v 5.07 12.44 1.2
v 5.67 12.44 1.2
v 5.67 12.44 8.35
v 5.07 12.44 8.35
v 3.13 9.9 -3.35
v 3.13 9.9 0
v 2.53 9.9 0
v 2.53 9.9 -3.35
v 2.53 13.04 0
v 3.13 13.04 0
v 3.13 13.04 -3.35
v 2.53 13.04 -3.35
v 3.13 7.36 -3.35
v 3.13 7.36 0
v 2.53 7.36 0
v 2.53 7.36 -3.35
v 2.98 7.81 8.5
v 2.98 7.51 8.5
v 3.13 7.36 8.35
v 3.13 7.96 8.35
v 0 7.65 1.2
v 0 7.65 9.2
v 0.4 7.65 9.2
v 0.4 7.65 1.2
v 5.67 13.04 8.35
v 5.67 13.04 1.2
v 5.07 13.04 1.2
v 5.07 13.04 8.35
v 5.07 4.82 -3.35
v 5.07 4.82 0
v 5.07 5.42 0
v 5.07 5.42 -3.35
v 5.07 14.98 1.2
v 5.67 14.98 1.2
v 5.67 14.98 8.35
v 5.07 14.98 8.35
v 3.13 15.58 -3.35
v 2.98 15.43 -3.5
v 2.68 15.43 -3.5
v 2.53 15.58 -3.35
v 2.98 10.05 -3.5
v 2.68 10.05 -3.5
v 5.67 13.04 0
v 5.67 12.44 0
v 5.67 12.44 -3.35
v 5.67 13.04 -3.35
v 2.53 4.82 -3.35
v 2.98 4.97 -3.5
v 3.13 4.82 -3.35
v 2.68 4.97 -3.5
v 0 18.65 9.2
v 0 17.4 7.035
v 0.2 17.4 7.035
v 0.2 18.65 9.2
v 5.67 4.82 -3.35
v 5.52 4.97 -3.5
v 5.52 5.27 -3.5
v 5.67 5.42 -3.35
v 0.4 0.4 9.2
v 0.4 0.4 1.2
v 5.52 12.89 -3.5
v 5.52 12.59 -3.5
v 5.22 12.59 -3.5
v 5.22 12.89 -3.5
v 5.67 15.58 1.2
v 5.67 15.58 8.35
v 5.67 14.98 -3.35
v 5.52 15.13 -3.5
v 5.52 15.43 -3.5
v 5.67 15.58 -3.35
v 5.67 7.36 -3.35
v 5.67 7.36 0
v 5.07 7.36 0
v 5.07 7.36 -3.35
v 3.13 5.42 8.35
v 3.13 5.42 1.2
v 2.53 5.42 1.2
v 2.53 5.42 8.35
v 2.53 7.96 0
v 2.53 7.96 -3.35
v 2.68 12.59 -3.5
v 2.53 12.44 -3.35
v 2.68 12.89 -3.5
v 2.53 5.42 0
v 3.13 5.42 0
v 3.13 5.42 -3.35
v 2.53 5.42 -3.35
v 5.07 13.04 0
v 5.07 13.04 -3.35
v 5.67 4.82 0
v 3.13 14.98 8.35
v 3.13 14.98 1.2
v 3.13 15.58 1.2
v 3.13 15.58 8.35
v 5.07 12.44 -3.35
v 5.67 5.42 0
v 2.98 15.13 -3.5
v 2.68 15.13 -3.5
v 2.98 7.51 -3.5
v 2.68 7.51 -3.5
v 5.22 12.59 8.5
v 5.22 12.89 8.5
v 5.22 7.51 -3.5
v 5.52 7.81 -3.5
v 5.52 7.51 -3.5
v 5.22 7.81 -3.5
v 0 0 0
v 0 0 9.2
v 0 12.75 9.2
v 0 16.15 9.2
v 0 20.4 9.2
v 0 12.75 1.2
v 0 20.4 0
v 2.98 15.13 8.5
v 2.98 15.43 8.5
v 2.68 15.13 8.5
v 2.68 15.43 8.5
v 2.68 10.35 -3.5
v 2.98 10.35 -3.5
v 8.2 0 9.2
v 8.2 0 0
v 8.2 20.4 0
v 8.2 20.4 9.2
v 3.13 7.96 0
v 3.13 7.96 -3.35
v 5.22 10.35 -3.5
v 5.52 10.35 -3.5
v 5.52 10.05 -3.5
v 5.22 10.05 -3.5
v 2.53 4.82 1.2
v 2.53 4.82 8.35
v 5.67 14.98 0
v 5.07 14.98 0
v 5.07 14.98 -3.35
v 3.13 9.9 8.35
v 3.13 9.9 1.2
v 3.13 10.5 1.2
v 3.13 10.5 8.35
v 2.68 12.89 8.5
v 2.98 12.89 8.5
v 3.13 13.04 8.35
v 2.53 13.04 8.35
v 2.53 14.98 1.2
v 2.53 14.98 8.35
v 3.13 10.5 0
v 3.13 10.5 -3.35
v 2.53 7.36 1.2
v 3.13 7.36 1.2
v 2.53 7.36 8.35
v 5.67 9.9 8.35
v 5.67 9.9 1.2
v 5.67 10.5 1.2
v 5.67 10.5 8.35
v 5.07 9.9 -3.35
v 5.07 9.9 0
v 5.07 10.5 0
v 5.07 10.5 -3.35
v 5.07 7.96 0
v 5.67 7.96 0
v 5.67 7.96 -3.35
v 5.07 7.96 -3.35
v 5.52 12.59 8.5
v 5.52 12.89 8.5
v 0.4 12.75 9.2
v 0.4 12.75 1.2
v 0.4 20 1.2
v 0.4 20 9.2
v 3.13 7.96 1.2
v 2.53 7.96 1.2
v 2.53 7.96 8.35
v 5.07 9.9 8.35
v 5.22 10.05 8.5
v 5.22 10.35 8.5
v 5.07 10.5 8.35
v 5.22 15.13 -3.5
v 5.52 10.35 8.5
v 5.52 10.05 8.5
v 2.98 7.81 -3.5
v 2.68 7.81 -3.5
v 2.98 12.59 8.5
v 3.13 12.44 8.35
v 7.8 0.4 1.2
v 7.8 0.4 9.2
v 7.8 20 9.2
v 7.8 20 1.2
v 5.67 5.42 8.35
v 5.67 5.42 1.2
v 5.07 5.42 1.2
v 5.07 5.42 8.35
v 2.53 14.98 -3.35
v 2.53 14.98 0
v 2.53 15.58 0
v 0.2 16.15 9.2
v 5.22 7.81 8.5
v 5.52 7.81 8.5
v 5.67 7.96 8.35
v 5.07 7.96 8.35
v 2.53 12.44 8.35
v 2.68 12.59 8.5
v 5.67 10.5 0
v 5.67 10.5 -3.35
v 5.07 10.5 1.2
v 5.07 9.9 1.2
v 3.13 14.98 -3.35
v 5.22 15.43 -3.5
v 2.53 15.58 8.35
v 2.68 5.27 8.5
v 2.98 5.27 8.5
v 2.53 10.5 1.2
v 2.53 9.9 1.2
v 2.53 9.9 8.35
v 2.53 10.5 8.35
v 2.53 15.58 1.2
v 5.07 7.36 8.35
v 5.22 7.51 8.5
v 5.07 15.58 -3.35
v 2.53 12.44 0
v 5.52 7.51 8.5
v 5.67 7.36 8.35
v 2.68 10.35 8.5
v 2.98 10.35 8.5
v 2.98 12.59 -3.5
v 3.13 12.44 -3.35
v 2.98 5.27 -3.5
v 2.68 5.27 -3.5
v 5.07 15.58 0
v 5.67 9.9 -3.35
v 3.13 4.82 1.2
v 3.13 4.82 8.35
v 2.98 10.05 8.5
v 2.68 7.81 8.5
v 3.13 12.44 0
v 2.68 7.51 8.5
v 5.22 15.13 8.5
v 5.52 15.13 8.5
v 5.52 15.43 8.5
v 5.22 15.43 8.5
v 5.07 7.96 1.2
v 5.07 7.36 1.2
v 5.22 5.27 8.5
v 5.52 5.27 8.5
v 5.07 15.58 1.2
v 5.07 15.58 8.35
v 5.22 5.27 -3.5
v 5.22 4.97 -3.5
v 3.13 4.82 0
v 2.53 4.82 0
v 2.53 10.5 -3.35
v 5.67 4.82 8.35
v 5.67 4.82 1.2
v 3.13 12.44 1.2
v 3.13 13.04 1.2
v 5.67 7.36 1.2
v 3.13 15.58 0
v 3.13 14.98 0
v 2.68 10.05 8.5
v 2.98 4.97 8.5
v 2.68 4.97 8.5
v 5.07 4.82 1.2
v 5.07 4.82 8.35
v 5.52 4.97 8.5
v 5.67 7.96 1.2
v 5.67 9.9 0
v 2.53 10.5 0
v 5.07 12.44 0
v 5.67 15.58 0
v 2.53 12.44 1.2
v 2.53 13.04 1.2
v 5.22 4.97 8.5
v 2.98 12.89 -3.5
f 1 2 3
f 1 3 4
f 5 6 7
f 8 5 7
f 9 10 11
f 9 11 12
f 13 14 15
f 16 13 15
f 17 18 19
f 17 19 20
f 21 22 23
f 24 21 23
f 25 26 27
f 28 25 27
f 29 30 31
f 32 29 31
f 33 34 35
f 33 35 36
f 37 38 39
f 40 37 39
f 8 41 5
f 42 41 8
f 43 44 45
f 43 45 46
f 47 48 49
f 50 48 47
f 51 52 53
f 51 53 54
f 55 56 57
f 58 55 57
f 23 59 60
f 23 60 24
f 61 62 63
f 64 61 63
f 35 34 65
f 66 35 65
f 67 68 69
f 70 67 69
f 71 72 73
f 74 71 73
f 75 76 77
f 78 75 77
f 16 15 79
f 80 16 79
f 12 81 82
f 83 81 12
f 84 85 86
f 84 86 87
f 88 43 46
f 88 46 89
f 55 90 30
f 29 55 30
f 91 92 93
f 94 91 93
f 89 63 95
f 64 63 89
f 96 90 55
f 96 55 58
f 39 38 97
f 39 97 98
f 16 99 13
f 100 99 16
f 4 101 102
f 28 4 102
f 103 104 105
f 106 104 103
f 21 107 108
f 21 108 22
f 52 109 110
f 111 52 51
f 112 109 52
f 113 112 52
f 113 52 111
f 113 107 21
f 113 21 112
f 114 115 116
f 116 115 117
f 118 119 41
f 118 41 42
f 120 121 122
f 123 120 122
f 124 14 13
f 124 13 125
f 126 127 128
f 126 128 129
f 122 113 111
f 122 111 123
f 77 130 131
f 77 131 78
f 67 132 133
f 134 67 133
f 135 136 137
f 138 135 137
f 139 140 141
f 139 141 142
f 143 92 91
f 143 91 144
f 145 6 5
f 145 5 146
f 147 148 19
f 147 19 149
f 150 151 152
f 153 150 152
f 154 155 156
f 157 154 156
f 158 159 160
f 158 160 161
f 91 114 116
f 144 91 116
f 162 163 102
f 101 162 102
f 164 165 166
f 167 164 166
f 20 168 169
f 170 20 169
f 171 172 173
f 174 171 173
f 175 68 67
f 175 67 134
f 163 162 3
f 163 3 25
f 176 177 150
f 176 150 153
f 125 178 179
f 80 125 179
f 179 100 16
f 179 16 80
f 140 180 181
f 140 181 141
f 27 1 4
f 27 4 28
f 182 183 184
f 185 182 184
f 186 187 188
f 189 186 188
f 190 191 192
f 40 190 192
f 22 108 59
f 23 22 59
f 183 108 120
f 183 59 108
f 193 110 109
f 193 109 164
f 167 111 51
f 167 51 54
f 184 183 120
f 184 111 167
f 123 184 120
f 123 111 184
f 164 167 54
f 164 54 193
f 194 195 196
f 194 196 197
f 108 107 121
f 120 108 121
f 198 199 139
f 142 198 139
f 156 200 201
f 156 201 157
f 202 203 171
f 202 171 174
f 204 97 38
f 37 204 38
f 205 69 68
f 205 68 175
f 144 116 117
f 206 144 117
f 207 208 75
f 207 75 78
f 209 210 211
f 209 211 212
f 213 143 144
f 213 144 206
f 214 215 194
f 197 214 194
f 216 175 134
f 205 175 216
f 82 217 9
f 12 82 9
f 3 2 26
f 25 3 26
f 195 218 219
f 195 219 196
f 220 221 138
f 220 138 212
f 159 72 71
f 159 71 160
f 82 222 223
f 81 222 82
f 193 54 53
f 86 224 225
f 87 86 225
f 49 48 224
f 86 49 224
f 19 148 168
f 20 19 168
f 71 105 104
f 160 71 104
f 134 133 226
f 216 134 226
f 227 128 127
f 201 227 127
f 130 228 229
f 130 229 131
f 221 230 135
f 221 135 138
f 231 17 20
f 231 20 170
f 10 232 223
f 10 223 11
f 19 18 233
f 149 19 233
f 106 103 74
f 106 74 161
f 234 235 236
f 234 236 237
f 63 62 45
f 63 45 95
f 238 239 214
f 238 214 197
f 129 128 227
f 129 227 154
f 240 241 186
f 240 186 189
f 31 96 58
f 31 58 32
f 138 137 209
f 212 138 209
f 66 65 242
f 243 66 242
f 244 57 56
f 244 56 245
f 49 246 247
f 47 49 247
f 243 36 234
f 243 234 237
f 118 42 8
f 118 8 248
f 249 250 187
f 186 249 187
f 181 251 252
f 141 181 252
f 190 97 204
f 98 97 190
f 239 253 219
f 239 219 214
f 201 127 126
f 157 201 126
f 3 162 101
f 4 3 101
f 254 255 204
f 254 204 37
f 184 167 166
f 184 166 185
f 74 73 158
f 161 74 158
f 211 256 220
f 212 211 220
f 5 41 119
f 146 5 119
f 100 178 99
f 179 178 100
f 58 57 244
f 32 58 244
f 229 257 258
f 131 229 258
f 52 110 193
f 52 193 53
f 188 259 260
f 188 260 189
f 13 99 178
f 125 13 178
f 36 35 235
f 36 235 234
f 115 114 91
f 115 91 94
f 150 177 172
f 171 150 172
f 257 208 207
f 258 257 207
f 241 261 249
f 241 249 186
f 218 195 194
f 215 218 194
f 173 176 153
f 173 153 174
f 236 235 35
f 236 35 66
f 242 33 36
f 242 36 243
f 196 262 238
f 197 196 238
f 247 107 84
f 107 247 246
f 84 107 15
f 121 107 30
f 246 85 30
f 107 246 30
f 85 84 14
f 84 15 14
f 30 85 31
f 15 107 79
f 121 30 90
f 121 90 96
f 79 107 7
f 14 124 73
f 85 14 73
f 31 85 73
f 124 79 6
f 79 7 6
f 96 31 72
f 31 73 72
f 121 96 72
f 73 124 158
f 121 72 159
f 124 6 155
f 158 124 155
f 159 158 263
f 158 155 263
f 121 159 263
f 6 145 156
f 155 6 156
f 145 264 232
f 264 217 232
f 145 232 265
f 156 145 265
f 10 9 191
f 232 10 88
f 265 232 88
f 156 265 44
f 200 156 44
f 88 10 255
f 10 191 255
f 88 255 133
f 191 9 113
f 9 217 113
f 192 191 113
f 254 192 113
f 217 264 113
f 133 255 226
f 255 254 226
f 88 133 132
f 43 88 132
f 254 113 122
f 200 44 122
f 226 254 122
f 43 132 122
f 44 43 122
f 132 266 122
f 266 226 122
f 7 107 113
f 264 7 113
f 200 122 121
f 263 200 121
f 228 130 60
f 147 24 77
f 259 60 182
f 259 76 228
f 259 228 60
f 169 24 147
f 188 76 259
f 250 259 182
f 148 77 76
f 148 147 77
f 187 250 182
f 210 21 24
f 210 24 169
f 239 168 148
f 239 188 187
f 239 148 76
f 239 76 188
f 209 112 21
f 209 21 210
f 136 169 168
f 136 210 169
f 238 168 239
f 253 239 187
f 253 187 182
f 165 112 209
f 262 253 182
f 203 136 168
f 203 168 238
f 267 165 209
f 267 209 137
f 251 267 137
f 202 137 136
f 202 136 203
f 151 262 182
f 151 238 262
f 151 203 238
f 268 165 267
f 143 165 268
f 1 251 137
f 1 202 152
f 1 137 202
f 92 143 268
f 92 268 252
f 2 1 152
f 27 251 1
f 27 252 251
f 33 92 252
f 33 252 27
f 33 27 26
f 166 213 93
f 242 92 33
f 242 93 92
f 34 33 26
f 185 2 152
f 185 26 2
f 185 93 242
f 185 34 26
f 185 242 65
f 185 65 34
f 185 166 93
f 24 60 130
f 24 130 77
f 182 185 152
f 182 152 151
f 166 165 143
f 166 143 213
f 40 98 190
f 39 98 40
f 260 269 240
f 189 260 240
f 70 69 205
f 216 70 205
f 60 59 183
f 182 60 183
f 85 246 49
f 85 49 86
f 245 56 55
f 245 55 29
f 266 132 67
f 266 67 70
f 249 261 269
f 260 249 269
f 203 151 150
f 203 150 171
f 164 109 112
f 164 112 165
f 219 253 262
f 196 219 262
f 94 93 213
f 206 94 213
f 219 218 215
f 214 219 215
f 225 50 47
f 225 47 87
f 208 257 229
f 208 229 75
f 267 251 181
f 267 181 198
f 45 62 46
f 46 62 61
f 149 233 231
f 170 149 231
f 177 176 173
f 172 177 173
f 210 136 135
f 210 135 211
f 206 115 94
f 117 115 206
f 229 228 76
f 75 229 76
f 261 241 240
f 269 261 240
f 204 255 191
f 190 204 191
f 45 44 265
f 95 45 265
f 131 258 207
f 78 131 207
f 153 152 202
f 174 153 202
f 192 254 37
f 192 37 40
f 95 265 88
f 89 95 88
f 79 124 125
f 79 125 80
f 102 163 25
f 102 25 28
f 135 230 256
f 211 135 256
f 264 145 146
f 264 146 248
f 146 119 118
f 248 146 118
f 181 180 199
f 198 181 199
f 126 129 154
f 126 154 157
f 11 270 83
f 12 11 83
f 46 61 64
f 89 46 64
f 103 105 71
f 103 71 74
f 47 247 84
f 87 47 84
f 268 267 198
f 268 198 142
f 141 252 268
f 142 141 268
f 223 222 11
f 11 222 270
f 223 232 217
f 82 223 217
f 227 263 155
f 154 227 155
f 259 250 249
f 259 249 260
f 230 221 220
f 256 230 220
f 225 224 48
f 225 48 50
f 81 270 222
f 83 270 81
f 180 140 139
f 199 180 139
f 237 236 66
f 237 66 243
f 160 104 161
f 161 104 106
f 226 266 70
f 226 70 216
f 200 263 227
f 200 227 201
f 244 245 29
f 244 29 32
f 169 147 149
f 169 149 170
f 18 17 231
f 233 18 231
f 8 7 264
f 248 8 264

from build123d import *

# Parameters (mm, degrees)
ESQUISSE1_W             = 8.2
ESQUISSE1_H             = 20.4
BOSS_EXTRU_1_DEPTH      = 9.2
ESQUISSE2_W             = 7.4
ESQUISSE2_H             = 19.6
ENL_V_MAT_EXTRU_1_DEPTH = 8
ESQUISSE3_W             = 0.6
ESQUISSE3_H             = 0.6
BOSS_EXTRU_2_DEPTH      = 3.5
BOSS_EXTRU_2_DEPTH_BACK = 8.5
CHANFREIN1_SIZE         = 0.15
ESQUISSE4_W             = 0.4
ESQUISSE4_H             = 5.1
ENL_V_MAT_EXTRU_2_DEPTH = 8
ENL_V_MAT_EXTRU_3_DEPTH = 0.2


with BuildPart() as part:
    # Esquisse1 → Boss.-Extru.1 (new body)
    with BuildSketch(Plane.XY):
        with Locations((4.1, 10.2)):
            Rectangle(ESQUISSE1_W, ESQUISSE1_H)
    extrude(amount=BOSS_EXTRU_1_DEPTH)

    # Esquisse2 → Enlèv. mat.-Extru.1 (cut)
    with BuildSketch(Plane.XY.offset(9.2)):
        with Locations((4.1, 10.2)):
            Rectangle(ESQUISSE2_W, ESQUISSE2_H)
    extrude(amount=-ENL_V_MAT_EXTRU_1_DEPTH, mode=Mode.SUBTRACT)

    # Esquisse3 → Boss.-Extru.2 (add, two sides)
    with BuildSketch(Plane(origin=(0, 0, 0), x_dir=(-1, 0, 0), z_dir=(0, 0, -1))) as boss_extru_2_sk:
        with Locations((-5.37, 15.28)):
            Rectangle(ESQUISSE3_W, ESQUISSE3_H)
        with Locations((-2.83, 15.28)):
            Rectangle(ESQUISSE3_W, ESQUISSE3_H)
        with Locations((-5.37, 12.74)):
            Rectangle(ESQUISSE3_W, ESQUISSE3_H)
        with Locations((-2.83, 12.74)):
            Rectangle(ESQUISSE3_W, ESQUISSE3_H)
        with Locations((-5.37, 10.2)):
            Rectangle(ESQUISSE3_W, ESQUISSE3_H)
        with Locations((-2.83, 10.2)):
            Rectangle(ESQUISSE3_W, ESQUISSE3_H)
        with Locations((-5.37, 7.66)):
            Rectangle(ESQUISSE3_W, ESQUISSE3_H)
        with Locations((-2.83, 7.66)):
            Rectangle(ESQUISSE3_W, ESQUISSE3_H)
        with Locations((-5.37, 5.12)):
            Rectangle(ESQUISSE3_W, ESQUISSE3_H)
        with Locations((-2.83, 5.12)):
            Rectangle(ESQUISSE3_W, ESQUISSE3_H)
    extrude(amount=BOSS_EXTRU_2_DEPTH)
    extrude(boss_extru_2_sk.sketch, amount=-BOSS_EXTRU_2_DEPTH_BACK)

    # Chanfrein1
    chanfrein1_edges = [part.edges().sort_by_distance(p)[0] for p in [
        (5.07, 10.2, 8.5),
        (5.37, 9.9, 8.5),
        (5.67, 10.2, 8.5),
        (5.37, 10.5, 8.5),
        (5.07, 10.2, -3.5),
        (5.37, 10.5, -3.5),
        (5.67, 10.2, -3.5),
        (5.37, 9.9, -3.5),
        (2.53, 10.2, 8.5),
        (2.83, 9.9, 8.5),
        (3.13, 10.2, 8.5),
        (2.83, 10.5, 8.5),
        (2.53, 10.2, -3.5),
        (2.83, 10.5, -3.5),
        (3.13, 10.2, -3.5),
        (2.83, 9.9, -3.5),
        (5.07, 7.66, 8.5),
        (5.37, 7.36, 8.5),
        (5.67, 7.66, 8.5),
        (5.37, 7.96, 8.5),
        (5.07, 7.66, -3.5),
        (5.37, 7.96, -3.5),
        (5.67, 7.66, -3.5),
        (5.37, 7.36, -3.5),
        (2.53, 7.66, 8.5),
        (2.83, 7.36, 8.5),
        (3.13, 7.66, 8.5),
        (2.83, 7.96, 8.5),
        (2.53, 7.66, -3.5),
        (2.83, 7.96, -3.5),
        (3.13, 7.66, -3.5),
        (2.83, 7.36, -3.5),
        (5.07, 5.12, 8.5),
        (5.37, 4.82, 8.5),
        (5.67, 5.12, 8.5),
        (5.37, 5.42, 8.5),
        (5.07, 5.12, -3.5),
        (5.37, 5.42, -3.5),
        (5.67, 5.12, -3.5),
        (5.37, 4.82, -3.5),
        (2.53, 5.12, 8.5),
        (2.83, 4.82, 8.5),
        (3.13, 5.12, 8.5),
        (2.83, 5.42, 8.5),
        (2.53, 5.12, -3.5),
        (2.83, 5.42, -3.5),
        (3.13, 5.12, -3.5),
        (2.83, 4.82, -3.5),
        (5.07, 15.28, 8.5),
        (5.37, 14.98, 8.5),
        (5.67, 15.28, 8.5),
        (5.37, 15.58, 8.5),
        (5.07, 15.28, -3.5),
        (5.37, 15.58, -3.5),
        (5.67, 15.28, -3.5),
        (5.37, 14.98, -3.5),
        (2.53, 15.28, 8.5),
        (2.83, 14.98, 8.5),
        (3.13, 15.28, 8.5),
        (2.83, 15.58, 8.5),
        (2.53, 15.28, -3.5),
        (2.83, 15.58, -3.5),
        (3.13, 15.28, -3.5),
        (2.83, 14.98, -3.5),
        (5.07, 12.74, 8.5),
        (5.37, 12.44, 8.5),
        (5.67, 12.74, 8.5),
        (5.37, 13.04, 8.5),
        (5.07, 12.74, -3.5),
        (5.37, 13.04, -3.5),
        (5.67, 12.74, -3.5),
        (5.37, 12.44, -3.5),
        (2.53, 12.74, 8.5),
        (2.83, 12.44, 8.5),
        (3.13, 12.74, 8.5),
        (2.83, 13.04, 8.5),
        (2.53, 12.74, -3.5),
        (2.83, 13.04, -3.5),
        (3.13, 12.74, -3.5),
        (2.83, 12.44, -3.5),
    ]]
    chamfer(chanfrein1_edges, length=CHANFREIN1_SIZE)

    # Esquisse4 → Enlèv. mat.-Extru.2 (cut)
    with BuildSketch(Plane.XY.offset(9.2)):
        with Locations((0.2, 10.2)):
            Rectangle(ESQUISSE4_W, ESQUISSE4_H)
    extrude(amount=-ENL_V_MAT_EXTRU_2_DEPTH, mode=Mode.SUBTRACT)

    # Esquisse5 → Enlèv. mat.-Extru.3 (cut)
    with BuildSketch(Plane.ZY):
        Polygon((9.2, 18.65), (9.2, 16.15), (7.034936491, 17.4), align=None)
    extrude(amount=-ENL_V_MAT_EXTRU_3_DEPTH, mode=Mode.SUBTRACT)


solid = part.part
